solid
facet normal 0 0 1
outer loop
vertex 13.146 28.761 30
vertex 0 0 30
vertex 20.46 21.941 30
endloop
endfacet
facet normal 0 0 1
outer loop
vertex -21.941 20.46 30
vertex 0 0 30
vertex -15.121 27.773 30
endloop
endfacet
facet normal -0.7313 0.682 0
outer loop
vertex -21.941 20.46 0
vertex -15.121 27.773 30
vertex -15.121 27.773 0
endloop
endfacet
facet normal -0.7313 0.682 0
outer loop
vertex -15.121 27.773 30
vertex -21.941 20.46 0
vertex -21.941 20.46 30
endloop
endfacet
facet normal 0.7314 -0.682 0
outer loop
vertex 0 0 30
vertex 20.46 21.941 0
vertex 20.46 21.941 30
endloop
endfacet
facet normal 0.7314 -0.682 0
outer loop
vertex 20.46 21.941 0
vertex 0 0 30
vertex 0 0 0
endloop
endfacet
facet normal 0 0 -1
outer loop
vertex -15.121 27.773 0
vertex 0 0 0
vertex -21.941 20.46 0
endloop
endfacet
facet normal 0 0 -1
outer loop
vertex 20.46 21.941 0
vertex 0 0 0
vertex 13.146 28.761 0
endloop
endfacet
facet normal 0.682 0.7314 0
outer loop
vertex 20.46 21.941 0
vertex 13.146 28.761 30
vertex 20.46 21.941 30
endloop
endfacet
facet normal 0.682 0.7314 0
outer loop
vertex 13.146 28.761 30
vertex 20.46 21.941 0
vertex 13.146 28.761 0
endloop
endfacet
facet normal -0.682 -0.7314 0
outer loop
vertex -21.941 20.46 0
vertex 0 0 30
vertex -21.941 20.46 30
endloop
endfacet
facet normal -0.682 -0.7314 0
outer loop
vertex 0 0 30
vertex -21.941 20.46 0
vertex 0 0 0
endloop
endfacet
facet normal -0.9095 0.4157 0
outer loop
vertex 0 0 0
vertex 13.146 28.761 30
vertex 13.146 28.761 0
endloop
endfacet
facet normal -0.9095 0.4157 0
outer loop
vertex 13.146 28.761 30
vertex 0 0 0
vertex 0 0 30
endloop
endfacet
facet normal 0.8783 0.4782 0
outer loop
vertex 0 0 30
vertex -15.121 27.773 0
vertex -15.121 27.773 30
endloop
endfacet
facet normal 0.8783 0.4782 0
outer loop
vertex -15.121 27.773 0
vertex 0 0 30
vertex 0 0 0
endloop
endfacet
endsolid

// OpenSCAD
rotate([0,0,2])
rotate([0,-90,0]){
    difference(){
        rotate([-45,0,0]) {
            cube([30, 30, 30]);
        }
        scale([1,2,1]) {
            rotate([-45,0,0]) {
                cube([30, 30, 30]);
            }
        }
    }
}
